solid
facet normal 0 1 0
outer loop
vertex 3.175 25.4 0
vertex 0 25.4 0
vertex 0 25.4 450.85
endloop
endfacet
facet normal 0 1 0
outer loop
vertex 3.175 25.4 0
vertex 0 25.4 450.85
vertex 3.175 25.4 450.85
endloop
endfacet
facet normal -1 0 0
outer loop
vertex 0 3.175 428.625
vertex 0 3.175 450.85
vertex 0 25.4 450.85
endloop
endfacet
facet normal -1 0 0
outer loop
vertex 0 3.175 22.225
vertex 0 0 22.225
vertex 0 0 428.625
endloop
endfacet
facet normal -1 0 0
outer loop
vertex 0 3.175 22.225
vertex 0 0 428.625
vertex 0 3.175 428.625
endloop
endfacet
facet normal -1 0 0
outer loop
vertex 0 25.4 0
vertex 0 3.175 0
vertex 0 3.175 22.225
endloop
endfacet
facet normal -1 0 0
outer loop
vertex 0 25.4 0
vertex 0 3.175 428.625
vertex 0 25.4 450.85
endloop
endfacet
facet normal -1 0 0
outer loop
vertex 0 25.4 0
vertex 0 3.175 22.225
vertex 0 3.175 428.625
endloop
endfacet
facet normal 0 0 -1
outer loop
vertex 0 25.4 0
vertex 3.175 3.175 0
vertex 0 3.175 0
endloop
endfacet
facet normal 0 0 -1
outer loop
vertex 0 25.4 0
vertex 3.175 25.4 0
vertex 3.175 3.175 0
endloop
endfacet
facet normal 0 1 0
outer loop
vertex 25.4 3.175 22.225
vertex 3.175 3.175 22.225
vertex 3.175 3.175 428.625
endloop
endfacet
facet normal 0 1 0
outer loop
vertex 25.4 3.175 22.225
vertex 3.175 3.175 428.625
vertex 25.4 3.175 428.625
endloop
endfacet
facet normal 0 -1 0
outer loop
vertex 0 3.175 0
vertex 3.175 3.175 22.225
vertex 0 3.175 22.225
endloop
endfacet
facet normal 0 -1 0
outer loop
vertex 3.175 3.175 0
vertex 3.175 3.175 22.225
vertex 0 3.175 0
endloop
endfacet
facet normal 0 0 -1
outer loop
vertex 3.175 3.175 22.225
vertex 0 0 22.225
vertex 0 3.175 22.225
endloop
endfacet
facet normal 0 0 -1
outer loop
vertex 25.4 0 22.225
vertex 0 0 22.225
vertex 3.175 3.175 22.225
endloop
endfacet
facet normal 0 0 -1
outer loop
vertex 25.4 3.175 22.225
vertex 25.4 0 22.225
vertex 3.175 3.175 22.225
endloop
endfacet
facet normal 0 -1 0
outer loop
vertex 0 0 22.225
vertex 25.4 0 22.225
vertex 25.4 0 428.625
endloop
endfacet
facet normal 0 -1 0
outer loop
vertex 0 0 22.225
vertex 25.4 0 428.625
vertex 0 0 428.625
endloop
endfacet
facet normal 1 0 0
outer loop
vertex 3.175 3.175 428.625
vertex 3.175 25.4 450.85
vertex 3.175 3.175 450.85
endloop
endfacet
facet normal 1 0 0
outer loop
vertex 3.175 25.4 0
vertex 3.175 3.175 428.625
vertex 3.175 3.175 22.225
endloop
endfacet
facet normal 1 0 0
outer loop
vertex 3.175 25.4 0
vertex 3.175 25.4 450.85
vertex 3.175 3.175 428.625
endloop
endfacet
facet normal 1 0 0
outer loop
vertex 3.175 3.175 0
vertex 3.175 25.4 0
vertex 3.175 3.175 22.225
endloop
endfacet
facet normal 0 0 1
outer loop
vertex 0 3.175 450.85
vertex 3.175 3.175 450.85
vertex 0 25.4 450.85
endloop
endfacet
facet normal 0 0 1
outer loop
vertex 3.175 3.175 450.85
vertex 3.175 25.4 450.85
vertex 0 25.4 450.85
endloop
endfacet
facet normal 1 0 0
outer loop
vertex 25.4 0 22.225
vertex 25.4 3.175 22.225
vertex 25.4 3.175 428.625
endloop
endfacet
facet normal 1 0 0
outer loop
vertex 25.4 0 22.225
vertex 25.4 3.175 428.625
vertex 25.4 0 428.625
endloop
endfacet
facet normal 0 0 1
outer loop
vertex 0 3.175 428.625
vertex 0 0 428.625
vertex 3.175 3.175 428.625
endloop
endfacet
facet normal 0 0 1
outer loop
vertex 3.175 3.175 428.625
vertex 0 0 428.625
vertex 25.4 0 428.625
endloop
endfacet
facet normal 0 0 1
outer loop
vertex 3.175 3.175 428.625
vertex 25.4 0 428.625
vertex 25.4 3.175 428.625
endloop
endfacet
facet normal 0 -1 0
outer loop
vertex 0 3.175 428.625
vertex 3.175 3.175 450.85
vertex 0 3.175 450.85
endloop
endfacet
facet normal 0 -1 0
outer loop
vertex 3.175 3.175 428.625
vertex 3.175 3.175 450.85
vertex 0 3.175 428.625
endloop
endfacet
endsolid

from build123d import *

# Parameters (mm, degrees)
BOSS_EXTRUDE1_DEPTH = 450.85
SKETCH2_W           = 22.225
SKETCH2_H           = 3.175
CUT_EXTRUDE1_DEPTH  = 26.4


with BuildPart() as part:
    # Sketch1 → Boss-Extrude1 (new body)
    with BuildSketch(Plane.XY):
        Polygon((0, 0), (0, 25.4), (3.175, 25.4), (3.175, 3.175), (25.4, 3.175), (25.4, 0), align=None)
    extrude(amount=BOSS_EXTRUDE1_DEPTH)

    # Sketch2 → Cut-Extrude1 (cut, through all)
    with BuildSketch(Plane(origin=(25.4, 0, 0), x_dir=(0, 0, -1), z_dir=(1, 0, 0))):
        with Locations((-439.7375, 1.5875)):
            Rectangle(SKETCH2_W, SKETCH2_H)
        with Locations((-11.1125, 1.5875)):
            Rectangle(SKETCH2_W, SKETCH2_H)
    extrude(amount=-CUT_EXTRUDE1_DEPTH, mode=Mode.SUBTRACT)


solid = part.part
